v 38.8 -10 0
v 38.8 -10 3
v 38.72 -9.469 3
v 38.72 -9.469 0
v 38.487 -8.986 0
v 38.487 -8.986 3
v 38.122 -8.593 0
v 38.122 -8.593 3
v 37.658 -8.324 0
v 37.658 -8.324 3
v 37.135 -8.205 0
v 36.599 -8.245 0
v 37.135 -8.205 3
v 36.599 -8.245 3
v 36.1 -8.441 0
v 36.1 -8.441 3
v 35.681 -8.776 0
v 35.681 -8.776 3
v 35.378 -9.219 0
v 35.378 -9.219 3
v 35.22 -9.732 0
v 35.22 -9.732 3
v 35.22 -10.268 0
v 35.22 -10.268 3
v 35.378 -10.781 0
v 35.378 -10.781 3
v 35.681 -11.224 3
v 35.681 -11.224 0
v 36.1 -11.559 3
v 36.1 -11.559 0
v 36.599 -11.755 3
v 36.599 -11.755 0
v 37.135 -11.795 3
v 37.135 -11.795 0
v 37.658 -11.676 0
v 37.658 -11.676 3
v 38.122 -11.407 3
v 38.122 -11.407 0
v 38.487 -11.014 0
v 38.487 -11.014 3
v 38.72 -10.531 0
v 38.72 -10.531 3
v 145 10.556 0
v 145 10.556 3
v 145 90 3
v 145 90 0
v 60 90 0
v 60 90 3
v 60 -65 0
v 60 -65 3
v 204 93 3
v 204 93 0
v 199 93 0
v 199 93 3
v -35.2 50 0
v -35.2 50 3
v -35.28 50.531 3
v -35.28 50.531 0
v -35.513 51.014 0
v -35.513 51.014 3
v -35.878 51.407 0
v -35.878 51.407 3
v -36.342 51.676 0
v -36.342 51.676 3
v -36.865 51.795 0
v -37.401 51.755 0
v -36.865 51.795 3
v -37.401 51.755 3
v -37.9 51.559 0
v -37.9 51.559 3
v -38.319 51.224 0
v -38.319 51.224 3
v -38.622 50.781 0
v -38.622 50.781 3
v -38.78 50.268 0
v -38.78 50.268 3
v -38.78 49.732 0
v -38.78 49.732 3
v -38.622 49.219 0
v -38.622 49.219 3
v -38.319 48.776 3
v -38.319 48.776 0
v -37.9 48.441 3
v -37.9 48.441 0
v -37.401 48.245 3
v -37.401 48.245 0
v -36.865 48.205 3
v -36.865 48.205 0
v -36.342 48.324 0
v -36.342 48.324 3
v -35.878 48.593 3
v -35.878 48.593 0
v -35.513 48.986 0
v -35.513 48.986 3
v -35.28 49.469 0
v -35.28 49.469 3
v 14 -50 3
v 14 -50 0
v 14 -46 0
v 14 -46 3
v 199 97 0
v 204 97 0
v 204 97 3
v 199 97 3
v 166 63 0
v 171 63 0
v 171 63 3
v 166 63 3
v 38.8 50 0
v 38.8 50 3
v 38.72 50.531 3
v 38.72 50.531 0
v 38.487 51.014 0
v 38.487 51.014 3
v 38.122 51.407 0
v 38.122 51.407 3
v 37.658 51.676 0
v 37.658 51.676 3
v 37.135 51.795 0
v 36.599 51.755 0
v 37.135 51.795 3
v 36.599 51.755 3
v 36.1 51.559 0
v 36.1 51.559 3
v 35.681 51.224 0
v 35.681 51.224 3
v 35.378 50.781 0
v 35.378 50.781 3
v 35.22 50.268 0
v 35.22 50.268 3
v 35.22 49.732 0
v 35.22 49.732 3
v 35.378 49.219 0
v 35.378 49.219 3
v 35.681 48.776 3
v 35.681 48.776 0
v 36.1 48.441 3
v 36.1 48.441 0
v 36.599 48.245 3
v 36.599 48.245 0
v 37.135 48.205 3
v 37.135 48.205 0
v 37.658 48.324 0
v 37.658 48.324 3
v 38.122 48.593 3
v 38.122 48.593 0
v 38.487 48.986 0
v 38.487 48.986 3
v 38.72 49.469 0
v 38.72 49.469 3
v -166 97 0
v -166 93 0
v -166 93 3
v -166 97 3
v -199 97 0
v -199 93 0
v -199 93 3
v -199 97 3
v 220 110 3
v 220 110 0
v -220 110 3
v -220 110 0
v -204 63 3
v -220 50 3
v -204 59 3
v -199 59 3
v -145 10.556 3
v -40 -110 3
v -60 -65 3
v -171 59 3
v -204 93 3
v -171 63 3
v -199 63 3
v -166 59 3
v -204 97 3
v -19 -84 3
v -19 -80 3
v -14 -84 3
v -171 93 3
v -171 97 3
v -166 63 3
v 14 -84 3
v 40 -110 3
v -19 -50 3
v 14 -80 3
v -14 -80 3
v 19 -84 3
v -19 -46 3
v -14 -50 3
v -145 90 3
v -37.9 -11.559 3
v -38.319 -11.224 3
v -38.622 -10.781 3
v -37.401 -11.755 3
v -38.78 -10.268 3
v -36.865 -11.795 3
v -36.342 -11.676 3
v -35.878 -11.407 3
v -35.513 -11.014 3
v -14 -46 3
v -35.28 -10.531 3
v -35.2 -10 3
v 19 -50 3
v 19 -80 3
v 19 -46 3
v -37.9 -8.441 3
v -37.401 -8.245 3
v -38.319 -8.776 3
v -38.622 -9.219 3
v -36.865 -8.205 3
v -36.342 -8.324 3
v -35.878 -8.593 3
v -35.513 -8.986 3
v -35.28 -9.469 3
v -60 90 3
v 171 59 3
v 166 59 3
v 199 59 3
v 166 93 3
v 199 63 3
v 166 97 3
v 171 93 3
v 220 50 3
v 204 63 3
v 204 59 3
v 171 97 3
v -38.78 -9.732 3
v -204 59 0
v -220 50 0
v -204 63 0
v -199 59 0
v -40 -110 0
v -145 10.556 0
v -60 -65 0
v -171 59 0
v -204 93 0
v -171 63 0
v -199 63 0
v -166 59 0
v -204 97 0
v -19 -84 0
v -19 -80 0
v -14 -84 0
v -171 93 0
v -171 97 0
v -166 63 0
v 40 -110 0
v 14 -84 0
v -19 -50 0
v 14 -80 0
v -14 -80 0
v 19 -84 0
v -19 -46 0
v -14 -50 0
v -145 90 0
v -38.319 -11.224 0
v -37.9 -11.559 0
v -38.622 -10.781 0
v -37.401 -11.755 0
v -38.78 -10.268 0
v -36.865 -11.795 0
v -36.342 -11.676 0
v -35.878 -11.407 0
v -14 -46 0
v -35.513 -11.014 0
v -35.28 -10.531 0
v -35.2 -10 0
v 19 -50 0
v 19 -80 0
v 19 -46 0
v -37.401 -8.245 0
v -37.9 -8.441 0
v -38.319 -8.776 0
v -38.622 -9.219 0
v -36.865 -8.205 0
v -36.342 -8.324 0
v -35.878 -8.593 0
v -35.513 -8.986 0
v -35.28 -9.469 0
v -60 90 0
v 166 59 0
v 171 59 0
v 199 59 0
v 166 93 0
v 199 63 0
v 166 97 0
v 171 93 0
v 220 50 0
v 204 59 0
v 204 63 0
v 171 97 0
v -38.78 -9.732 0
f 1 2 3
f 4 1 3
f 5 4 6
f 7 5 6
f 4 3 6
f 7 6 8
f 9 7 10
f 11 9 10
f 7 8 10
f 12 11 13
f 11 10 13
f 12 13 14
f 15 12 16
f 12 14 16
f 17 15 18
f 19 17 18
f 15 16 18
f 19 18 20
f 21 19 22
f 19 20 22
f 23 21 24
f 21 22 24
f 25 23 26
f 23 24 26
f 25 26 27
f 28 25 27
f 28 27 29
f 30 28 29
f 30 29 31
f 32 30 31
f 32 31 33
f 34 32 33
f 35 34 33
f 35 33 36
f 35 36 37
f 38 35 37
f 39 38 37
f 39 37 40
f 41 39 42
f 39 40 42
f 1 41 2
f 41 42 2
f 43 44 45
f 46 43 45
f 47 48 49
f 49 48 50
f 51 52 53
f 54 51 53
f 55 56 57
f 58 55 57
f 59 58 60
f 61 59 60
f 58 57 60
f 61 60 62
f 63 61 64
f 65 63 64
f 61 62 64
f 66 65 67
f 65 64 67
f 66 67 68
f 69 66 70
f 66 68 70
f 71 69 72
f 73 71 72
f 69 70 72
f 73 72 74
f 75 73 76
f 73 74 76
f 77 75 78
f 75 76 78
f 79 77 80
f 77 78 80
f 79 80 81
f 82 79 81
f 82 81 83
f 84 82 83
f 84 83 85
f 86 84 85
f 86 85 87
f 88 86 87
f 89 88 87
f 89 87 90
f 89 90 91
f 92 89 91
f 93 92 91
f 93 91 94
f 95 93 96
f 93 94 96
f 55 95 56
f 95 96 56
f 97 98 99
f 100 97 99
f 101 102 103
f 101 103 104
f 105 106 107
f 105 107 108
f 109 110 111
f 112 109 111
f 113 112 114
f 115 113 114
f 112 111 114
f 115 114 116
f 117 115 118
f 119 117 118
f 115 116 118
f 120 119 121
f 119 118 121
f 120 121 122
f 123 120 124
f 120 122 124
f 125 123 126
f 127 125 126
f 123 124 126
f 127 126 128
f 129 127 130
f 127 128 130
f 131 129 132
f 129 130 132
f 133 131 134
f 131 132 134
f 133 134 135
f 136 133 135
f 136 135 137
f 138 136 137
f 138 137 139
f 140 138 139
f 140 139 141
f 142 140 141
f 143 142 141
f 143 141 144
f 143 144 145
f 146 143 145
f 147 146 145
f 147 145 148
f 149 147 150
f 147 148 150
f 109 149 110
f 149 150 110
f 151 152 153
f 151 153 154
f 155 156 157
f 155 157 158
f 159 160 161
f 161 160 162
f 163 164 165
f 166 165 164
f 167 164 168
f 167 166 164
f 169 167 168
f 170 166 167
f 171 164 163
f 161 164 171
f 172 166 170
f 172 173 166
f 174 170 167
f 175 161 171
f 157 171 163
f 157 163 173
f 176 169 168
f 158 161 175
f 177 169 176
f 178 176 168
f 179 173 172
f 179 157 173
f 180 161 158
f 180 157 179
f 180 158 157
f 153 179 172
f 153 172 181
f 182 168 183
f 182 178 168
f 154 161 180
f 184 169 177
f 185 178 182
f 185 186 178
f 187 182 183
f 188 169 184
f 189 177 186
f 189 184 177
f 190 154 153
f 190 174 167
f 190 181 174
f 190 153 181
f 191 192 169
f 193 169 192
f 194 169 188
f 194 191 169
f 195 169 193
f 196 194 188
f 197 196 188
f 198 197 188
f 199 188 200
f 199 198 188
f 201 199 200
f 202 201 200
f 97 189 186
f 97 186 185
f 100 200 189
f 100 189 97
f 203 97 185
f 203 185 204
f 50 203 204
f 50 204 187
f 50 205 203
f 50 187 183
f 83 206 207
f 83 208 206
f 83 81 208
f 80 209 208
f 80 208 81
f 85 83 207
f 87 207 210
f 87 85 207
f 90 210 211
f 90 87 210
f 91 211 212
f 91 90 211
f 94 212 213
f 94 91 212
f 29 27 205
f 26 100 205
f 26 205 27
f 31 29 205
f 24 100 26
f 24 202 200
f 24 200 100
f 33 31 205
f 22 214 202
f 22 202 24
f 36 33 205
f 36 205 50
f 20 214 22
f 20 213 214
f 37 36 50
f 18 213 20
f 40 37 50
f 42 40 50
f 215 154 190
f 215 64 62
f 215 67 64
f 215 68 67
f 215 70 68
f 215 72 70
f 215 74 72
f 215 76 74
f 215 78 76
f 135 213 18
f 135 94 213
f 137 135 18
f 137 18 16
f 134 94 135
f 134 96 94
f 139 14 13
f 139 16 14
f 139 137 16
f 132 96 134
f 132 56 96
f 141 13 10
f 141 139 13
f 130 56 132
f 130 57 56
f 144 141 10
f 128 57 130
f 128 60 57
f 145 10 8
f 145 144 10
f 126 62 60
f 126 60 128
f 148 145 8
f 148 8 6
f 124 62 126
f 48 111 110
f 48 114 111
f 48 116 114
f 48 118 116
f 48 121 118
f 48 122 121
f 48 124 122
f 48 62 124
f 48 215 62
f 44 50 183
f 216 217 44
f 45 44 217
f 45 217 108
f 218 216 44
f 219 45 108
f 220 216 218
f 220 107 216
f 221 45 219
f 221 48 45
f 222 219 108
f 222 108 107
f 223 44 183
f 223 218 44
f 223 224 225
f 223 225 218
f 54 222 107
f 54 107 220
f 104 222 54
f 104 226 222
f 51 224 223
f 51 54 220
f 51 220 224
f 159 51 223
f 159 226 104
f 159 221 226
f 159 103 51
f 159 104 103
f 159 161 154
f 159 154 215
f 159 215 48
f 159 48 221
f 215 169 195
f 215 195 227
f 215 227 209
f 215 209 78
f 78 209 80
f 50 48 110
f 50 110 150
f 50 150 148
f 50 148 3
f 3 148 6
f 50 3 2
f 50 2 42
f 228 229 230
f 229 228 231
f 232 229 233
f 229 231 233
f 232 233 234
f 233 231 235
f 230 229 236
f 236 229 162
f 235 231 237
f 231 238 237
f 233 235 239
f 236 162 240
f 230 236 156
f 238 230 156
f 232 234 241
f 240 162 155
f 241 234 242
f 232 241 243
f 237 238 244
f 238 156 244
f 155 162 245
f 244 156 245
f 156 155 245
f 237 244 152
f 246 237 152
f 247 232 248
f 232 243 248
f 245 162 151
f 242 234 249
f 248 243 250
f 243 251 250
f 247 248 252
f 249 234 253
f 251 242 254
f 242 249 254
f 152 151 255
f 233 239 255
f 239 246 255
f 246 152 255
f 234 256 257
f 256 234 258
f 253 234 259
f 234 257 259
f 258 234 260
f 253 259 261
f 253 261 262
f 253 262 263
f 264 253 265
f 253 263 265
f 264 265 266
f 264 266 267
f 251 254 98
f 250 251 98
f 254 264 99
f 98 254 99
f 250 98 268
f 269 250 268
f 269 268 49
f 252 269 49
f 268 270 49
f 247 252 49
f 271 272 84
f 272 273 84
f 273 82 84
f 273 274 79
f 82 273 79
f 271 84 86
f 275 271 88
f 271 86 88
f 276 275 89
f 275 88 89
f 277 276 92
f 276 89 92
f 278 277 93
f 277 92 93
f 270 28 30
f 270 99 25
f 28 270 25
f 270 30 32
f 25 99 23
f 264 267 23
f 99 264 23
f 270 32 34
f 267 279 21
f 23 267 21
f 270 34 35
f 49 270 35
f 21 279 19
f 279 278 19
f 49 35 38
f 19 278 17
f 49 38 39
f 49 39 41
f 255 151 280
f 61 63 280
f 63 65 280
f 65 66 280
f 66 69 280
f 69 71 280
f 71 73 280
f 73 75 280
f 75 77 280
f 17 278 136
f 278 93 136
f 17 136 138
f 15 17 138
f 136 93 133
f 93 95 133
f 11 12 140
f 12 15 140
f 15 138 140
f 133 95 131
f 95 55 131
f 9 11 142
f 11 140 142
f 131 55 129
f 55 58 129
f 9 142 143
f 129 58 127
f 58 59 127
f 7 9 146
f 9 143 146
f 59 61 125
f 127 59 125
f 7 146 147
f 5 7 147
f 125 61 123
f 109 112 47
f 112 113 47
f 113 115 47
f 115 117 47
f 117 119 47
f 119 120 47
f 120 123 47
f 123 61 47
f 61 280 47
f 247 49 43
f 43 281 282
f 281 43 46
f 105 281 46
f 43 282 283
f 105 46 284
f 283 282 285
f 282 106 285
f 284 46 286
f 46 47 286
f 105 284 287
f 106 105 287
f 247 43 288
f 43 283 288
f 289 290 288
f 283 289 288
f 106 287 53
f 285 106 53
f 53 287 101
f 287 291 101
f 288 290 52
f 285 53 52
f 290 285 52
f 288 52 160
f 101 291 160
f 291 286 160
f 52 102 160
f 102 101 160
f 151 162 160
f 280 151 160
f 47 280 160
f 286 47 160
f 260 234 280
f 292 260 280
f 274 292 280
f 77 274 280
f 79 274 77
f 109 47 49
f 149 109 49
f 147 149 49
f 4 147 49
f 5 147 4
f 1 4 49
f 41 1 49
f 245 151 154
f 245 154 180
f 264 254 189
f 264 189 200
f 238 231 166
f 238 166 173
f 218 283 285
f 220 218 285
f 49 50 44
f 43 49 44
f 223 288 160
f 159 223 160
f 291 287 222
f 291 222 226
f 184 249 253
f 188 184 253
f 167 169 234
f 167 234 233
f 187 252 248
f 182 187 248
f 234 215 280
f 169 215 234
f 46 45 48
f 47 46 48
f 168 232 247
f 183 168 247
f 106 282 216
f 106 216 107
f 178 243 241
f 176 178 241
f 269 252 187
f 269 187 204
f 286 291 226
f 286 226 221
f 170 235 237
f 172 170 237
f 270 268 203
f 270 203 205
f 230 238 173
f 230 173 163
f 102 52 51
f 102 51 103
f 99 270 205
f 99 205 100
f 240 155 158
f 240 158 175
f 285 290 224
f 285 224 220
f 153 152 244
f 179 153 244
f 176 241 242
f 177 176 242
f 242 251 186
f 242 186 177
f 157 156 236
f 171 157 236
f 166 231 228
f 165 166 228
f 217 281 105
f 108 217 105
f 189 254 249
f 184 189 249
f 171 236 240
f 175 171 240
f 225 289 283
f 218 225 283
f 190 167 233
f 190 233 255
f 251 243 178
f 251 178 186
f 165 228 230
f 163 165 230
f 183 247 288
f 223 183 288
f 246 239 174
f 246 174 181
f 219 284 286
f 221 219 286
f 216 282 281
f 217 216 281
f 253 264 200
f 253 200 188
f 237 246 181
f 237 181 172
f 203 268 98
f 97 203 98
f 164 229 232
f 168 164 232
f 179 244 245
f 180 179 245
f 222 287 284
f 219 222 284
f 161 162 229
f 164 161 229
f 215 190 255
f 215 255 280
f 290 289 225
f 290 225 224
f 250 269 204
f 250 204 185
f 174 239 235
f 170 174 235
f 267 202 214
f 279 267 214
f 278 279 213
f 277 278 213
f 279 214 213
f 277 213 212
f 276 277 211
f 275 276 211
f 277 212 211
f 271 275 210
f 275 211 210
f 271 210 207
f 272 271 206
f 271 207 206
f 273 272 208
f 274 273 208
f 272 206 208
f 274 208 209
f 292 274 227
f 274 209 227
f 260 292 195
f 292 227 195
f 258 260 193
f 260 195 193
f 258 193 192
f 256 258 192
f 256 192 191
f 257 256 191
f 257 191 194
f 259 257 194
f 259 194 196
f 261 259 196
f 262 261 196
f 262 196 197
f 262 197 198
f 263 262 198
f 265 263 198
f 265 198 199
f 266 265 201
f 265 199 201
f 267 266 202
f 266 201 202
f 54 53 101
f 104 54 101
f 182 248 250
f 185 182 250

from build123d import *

# Parameters (mm, degrees)
BOSS_EXTRU_1_DEPTH      = 3
ESQUISSE2_W             = 5
ESQUISSE2_H             = 4
ENL_V_MAT_EXTRU_1_DEPTH = 3
ESQUISSE4_R             = 1.8
ENL_V_MAT_EXTRU_2_DEPTH = 3
ENL_V_MAT_EXTRU_3_DEPTH = 3


with BuildPart() as part:
    # Esquisse1 → Boss.-Extru.1 (new body)
    with BuildSketch(Plane.XY):
        Polygon((-220, 50), (-40, -110), (40, -110), (220, 50), (220, 110), (-220, 110), align=None)
    extrude(amount=BOSS_EXTRU_1_DEPTH)

    # Esquisse2 → Enlèv. mat.-Extru.1 (cut)
    with BuildSketch(Plane(origin=(0, 0, 0), x_dir=(-1, 0, 0), z_dir=(0, 0, -1))):
        with Locations((-201.5, 95)):
            Rectangle(ESQUISSE2_W, ESQUISSE2_H)
        with Locations((-168.5, 95)):
            Rectangle(ESQUISSE2_W, ESQUISSE2_H)
        with Locations((-168.5, 61)):
            Rectangle(ESQUISSE2_W, ESQUISSE2_H)
        with Locations((-201.5, 61)):
            Rectangle(ESQUISSE2_W, ESQUISSE2_H)
        with Locations((168.5, 61)):
            Rectangle(ESQUISSE2_W, ESQUISSE2_H)
        with Locations((201.5, 61)):
            Rectangle(ESQUISSE2_W, ESQUISSE2_H)
        with Locations((168.5, 95)):
            Rectangle(ESQUISSE2_W, ESQUISSE2_H)
        with Locations((201.5, 95)):
            Rectangle(ESQUISSE2_W, ESQUISSE2_H)
        with Locations((-16.5, -48)):
            Rectangle(ESQUISSE2_W, ESQUISSE2_H)
        with Locations((16.5, -48)):
            Rectangle(ESQUISSE2_W, ESQUISSE2_H)
        with Locations((16.5, -82)):
            Rectangle(ESQUISSE2_W, ESQUISSE2_H)
        with Locations((-16.5, -82)):
            Rectangle(ESQUISSE2_W, ESQUISSE2_H)
    extrude(amount=-ENL_V_MAT_EXTRU_1_DEPTH, mode=Mode.SUBTRACT)

    # Esquisse4 → Enlèv. mat.-Extru.2 (cut)
    with BuildSketch(Plane.XY.offset(3)):
        with Locations((-37, 50)):
            Circle(ESQUISSE4_R)
        with Locations((37, 50)):
            Circle(ESQUISSE4_R)
        with Locations((-37, -10)):
            Circle(ESQUISSE4_R)
        with Locations((37, -10)):
            Circle(ESQUISSE4_R)
    extrude(amount=-ENL_V_MAT_EXTRU_2_DEPTH, mode=Mode.SUBTRACT)

    # Esquisse5 → Enlèv. mat.-Extru.3 (cut)
    with BuildSketch(Plane.XY.offset(3)):
        Polygon((-145, 90), (-60, 90), (-60, -65), (-145, 10.555555556), align=None)
        Polygon((145, 90), (60, 90), (60, -65), (145, 10.555555556), align=None)
    extrude(amount=-ENL_V_MAT_EXTRU_3_DEPTH, mode=Mode.SUBTRACT)


solid = part.part
